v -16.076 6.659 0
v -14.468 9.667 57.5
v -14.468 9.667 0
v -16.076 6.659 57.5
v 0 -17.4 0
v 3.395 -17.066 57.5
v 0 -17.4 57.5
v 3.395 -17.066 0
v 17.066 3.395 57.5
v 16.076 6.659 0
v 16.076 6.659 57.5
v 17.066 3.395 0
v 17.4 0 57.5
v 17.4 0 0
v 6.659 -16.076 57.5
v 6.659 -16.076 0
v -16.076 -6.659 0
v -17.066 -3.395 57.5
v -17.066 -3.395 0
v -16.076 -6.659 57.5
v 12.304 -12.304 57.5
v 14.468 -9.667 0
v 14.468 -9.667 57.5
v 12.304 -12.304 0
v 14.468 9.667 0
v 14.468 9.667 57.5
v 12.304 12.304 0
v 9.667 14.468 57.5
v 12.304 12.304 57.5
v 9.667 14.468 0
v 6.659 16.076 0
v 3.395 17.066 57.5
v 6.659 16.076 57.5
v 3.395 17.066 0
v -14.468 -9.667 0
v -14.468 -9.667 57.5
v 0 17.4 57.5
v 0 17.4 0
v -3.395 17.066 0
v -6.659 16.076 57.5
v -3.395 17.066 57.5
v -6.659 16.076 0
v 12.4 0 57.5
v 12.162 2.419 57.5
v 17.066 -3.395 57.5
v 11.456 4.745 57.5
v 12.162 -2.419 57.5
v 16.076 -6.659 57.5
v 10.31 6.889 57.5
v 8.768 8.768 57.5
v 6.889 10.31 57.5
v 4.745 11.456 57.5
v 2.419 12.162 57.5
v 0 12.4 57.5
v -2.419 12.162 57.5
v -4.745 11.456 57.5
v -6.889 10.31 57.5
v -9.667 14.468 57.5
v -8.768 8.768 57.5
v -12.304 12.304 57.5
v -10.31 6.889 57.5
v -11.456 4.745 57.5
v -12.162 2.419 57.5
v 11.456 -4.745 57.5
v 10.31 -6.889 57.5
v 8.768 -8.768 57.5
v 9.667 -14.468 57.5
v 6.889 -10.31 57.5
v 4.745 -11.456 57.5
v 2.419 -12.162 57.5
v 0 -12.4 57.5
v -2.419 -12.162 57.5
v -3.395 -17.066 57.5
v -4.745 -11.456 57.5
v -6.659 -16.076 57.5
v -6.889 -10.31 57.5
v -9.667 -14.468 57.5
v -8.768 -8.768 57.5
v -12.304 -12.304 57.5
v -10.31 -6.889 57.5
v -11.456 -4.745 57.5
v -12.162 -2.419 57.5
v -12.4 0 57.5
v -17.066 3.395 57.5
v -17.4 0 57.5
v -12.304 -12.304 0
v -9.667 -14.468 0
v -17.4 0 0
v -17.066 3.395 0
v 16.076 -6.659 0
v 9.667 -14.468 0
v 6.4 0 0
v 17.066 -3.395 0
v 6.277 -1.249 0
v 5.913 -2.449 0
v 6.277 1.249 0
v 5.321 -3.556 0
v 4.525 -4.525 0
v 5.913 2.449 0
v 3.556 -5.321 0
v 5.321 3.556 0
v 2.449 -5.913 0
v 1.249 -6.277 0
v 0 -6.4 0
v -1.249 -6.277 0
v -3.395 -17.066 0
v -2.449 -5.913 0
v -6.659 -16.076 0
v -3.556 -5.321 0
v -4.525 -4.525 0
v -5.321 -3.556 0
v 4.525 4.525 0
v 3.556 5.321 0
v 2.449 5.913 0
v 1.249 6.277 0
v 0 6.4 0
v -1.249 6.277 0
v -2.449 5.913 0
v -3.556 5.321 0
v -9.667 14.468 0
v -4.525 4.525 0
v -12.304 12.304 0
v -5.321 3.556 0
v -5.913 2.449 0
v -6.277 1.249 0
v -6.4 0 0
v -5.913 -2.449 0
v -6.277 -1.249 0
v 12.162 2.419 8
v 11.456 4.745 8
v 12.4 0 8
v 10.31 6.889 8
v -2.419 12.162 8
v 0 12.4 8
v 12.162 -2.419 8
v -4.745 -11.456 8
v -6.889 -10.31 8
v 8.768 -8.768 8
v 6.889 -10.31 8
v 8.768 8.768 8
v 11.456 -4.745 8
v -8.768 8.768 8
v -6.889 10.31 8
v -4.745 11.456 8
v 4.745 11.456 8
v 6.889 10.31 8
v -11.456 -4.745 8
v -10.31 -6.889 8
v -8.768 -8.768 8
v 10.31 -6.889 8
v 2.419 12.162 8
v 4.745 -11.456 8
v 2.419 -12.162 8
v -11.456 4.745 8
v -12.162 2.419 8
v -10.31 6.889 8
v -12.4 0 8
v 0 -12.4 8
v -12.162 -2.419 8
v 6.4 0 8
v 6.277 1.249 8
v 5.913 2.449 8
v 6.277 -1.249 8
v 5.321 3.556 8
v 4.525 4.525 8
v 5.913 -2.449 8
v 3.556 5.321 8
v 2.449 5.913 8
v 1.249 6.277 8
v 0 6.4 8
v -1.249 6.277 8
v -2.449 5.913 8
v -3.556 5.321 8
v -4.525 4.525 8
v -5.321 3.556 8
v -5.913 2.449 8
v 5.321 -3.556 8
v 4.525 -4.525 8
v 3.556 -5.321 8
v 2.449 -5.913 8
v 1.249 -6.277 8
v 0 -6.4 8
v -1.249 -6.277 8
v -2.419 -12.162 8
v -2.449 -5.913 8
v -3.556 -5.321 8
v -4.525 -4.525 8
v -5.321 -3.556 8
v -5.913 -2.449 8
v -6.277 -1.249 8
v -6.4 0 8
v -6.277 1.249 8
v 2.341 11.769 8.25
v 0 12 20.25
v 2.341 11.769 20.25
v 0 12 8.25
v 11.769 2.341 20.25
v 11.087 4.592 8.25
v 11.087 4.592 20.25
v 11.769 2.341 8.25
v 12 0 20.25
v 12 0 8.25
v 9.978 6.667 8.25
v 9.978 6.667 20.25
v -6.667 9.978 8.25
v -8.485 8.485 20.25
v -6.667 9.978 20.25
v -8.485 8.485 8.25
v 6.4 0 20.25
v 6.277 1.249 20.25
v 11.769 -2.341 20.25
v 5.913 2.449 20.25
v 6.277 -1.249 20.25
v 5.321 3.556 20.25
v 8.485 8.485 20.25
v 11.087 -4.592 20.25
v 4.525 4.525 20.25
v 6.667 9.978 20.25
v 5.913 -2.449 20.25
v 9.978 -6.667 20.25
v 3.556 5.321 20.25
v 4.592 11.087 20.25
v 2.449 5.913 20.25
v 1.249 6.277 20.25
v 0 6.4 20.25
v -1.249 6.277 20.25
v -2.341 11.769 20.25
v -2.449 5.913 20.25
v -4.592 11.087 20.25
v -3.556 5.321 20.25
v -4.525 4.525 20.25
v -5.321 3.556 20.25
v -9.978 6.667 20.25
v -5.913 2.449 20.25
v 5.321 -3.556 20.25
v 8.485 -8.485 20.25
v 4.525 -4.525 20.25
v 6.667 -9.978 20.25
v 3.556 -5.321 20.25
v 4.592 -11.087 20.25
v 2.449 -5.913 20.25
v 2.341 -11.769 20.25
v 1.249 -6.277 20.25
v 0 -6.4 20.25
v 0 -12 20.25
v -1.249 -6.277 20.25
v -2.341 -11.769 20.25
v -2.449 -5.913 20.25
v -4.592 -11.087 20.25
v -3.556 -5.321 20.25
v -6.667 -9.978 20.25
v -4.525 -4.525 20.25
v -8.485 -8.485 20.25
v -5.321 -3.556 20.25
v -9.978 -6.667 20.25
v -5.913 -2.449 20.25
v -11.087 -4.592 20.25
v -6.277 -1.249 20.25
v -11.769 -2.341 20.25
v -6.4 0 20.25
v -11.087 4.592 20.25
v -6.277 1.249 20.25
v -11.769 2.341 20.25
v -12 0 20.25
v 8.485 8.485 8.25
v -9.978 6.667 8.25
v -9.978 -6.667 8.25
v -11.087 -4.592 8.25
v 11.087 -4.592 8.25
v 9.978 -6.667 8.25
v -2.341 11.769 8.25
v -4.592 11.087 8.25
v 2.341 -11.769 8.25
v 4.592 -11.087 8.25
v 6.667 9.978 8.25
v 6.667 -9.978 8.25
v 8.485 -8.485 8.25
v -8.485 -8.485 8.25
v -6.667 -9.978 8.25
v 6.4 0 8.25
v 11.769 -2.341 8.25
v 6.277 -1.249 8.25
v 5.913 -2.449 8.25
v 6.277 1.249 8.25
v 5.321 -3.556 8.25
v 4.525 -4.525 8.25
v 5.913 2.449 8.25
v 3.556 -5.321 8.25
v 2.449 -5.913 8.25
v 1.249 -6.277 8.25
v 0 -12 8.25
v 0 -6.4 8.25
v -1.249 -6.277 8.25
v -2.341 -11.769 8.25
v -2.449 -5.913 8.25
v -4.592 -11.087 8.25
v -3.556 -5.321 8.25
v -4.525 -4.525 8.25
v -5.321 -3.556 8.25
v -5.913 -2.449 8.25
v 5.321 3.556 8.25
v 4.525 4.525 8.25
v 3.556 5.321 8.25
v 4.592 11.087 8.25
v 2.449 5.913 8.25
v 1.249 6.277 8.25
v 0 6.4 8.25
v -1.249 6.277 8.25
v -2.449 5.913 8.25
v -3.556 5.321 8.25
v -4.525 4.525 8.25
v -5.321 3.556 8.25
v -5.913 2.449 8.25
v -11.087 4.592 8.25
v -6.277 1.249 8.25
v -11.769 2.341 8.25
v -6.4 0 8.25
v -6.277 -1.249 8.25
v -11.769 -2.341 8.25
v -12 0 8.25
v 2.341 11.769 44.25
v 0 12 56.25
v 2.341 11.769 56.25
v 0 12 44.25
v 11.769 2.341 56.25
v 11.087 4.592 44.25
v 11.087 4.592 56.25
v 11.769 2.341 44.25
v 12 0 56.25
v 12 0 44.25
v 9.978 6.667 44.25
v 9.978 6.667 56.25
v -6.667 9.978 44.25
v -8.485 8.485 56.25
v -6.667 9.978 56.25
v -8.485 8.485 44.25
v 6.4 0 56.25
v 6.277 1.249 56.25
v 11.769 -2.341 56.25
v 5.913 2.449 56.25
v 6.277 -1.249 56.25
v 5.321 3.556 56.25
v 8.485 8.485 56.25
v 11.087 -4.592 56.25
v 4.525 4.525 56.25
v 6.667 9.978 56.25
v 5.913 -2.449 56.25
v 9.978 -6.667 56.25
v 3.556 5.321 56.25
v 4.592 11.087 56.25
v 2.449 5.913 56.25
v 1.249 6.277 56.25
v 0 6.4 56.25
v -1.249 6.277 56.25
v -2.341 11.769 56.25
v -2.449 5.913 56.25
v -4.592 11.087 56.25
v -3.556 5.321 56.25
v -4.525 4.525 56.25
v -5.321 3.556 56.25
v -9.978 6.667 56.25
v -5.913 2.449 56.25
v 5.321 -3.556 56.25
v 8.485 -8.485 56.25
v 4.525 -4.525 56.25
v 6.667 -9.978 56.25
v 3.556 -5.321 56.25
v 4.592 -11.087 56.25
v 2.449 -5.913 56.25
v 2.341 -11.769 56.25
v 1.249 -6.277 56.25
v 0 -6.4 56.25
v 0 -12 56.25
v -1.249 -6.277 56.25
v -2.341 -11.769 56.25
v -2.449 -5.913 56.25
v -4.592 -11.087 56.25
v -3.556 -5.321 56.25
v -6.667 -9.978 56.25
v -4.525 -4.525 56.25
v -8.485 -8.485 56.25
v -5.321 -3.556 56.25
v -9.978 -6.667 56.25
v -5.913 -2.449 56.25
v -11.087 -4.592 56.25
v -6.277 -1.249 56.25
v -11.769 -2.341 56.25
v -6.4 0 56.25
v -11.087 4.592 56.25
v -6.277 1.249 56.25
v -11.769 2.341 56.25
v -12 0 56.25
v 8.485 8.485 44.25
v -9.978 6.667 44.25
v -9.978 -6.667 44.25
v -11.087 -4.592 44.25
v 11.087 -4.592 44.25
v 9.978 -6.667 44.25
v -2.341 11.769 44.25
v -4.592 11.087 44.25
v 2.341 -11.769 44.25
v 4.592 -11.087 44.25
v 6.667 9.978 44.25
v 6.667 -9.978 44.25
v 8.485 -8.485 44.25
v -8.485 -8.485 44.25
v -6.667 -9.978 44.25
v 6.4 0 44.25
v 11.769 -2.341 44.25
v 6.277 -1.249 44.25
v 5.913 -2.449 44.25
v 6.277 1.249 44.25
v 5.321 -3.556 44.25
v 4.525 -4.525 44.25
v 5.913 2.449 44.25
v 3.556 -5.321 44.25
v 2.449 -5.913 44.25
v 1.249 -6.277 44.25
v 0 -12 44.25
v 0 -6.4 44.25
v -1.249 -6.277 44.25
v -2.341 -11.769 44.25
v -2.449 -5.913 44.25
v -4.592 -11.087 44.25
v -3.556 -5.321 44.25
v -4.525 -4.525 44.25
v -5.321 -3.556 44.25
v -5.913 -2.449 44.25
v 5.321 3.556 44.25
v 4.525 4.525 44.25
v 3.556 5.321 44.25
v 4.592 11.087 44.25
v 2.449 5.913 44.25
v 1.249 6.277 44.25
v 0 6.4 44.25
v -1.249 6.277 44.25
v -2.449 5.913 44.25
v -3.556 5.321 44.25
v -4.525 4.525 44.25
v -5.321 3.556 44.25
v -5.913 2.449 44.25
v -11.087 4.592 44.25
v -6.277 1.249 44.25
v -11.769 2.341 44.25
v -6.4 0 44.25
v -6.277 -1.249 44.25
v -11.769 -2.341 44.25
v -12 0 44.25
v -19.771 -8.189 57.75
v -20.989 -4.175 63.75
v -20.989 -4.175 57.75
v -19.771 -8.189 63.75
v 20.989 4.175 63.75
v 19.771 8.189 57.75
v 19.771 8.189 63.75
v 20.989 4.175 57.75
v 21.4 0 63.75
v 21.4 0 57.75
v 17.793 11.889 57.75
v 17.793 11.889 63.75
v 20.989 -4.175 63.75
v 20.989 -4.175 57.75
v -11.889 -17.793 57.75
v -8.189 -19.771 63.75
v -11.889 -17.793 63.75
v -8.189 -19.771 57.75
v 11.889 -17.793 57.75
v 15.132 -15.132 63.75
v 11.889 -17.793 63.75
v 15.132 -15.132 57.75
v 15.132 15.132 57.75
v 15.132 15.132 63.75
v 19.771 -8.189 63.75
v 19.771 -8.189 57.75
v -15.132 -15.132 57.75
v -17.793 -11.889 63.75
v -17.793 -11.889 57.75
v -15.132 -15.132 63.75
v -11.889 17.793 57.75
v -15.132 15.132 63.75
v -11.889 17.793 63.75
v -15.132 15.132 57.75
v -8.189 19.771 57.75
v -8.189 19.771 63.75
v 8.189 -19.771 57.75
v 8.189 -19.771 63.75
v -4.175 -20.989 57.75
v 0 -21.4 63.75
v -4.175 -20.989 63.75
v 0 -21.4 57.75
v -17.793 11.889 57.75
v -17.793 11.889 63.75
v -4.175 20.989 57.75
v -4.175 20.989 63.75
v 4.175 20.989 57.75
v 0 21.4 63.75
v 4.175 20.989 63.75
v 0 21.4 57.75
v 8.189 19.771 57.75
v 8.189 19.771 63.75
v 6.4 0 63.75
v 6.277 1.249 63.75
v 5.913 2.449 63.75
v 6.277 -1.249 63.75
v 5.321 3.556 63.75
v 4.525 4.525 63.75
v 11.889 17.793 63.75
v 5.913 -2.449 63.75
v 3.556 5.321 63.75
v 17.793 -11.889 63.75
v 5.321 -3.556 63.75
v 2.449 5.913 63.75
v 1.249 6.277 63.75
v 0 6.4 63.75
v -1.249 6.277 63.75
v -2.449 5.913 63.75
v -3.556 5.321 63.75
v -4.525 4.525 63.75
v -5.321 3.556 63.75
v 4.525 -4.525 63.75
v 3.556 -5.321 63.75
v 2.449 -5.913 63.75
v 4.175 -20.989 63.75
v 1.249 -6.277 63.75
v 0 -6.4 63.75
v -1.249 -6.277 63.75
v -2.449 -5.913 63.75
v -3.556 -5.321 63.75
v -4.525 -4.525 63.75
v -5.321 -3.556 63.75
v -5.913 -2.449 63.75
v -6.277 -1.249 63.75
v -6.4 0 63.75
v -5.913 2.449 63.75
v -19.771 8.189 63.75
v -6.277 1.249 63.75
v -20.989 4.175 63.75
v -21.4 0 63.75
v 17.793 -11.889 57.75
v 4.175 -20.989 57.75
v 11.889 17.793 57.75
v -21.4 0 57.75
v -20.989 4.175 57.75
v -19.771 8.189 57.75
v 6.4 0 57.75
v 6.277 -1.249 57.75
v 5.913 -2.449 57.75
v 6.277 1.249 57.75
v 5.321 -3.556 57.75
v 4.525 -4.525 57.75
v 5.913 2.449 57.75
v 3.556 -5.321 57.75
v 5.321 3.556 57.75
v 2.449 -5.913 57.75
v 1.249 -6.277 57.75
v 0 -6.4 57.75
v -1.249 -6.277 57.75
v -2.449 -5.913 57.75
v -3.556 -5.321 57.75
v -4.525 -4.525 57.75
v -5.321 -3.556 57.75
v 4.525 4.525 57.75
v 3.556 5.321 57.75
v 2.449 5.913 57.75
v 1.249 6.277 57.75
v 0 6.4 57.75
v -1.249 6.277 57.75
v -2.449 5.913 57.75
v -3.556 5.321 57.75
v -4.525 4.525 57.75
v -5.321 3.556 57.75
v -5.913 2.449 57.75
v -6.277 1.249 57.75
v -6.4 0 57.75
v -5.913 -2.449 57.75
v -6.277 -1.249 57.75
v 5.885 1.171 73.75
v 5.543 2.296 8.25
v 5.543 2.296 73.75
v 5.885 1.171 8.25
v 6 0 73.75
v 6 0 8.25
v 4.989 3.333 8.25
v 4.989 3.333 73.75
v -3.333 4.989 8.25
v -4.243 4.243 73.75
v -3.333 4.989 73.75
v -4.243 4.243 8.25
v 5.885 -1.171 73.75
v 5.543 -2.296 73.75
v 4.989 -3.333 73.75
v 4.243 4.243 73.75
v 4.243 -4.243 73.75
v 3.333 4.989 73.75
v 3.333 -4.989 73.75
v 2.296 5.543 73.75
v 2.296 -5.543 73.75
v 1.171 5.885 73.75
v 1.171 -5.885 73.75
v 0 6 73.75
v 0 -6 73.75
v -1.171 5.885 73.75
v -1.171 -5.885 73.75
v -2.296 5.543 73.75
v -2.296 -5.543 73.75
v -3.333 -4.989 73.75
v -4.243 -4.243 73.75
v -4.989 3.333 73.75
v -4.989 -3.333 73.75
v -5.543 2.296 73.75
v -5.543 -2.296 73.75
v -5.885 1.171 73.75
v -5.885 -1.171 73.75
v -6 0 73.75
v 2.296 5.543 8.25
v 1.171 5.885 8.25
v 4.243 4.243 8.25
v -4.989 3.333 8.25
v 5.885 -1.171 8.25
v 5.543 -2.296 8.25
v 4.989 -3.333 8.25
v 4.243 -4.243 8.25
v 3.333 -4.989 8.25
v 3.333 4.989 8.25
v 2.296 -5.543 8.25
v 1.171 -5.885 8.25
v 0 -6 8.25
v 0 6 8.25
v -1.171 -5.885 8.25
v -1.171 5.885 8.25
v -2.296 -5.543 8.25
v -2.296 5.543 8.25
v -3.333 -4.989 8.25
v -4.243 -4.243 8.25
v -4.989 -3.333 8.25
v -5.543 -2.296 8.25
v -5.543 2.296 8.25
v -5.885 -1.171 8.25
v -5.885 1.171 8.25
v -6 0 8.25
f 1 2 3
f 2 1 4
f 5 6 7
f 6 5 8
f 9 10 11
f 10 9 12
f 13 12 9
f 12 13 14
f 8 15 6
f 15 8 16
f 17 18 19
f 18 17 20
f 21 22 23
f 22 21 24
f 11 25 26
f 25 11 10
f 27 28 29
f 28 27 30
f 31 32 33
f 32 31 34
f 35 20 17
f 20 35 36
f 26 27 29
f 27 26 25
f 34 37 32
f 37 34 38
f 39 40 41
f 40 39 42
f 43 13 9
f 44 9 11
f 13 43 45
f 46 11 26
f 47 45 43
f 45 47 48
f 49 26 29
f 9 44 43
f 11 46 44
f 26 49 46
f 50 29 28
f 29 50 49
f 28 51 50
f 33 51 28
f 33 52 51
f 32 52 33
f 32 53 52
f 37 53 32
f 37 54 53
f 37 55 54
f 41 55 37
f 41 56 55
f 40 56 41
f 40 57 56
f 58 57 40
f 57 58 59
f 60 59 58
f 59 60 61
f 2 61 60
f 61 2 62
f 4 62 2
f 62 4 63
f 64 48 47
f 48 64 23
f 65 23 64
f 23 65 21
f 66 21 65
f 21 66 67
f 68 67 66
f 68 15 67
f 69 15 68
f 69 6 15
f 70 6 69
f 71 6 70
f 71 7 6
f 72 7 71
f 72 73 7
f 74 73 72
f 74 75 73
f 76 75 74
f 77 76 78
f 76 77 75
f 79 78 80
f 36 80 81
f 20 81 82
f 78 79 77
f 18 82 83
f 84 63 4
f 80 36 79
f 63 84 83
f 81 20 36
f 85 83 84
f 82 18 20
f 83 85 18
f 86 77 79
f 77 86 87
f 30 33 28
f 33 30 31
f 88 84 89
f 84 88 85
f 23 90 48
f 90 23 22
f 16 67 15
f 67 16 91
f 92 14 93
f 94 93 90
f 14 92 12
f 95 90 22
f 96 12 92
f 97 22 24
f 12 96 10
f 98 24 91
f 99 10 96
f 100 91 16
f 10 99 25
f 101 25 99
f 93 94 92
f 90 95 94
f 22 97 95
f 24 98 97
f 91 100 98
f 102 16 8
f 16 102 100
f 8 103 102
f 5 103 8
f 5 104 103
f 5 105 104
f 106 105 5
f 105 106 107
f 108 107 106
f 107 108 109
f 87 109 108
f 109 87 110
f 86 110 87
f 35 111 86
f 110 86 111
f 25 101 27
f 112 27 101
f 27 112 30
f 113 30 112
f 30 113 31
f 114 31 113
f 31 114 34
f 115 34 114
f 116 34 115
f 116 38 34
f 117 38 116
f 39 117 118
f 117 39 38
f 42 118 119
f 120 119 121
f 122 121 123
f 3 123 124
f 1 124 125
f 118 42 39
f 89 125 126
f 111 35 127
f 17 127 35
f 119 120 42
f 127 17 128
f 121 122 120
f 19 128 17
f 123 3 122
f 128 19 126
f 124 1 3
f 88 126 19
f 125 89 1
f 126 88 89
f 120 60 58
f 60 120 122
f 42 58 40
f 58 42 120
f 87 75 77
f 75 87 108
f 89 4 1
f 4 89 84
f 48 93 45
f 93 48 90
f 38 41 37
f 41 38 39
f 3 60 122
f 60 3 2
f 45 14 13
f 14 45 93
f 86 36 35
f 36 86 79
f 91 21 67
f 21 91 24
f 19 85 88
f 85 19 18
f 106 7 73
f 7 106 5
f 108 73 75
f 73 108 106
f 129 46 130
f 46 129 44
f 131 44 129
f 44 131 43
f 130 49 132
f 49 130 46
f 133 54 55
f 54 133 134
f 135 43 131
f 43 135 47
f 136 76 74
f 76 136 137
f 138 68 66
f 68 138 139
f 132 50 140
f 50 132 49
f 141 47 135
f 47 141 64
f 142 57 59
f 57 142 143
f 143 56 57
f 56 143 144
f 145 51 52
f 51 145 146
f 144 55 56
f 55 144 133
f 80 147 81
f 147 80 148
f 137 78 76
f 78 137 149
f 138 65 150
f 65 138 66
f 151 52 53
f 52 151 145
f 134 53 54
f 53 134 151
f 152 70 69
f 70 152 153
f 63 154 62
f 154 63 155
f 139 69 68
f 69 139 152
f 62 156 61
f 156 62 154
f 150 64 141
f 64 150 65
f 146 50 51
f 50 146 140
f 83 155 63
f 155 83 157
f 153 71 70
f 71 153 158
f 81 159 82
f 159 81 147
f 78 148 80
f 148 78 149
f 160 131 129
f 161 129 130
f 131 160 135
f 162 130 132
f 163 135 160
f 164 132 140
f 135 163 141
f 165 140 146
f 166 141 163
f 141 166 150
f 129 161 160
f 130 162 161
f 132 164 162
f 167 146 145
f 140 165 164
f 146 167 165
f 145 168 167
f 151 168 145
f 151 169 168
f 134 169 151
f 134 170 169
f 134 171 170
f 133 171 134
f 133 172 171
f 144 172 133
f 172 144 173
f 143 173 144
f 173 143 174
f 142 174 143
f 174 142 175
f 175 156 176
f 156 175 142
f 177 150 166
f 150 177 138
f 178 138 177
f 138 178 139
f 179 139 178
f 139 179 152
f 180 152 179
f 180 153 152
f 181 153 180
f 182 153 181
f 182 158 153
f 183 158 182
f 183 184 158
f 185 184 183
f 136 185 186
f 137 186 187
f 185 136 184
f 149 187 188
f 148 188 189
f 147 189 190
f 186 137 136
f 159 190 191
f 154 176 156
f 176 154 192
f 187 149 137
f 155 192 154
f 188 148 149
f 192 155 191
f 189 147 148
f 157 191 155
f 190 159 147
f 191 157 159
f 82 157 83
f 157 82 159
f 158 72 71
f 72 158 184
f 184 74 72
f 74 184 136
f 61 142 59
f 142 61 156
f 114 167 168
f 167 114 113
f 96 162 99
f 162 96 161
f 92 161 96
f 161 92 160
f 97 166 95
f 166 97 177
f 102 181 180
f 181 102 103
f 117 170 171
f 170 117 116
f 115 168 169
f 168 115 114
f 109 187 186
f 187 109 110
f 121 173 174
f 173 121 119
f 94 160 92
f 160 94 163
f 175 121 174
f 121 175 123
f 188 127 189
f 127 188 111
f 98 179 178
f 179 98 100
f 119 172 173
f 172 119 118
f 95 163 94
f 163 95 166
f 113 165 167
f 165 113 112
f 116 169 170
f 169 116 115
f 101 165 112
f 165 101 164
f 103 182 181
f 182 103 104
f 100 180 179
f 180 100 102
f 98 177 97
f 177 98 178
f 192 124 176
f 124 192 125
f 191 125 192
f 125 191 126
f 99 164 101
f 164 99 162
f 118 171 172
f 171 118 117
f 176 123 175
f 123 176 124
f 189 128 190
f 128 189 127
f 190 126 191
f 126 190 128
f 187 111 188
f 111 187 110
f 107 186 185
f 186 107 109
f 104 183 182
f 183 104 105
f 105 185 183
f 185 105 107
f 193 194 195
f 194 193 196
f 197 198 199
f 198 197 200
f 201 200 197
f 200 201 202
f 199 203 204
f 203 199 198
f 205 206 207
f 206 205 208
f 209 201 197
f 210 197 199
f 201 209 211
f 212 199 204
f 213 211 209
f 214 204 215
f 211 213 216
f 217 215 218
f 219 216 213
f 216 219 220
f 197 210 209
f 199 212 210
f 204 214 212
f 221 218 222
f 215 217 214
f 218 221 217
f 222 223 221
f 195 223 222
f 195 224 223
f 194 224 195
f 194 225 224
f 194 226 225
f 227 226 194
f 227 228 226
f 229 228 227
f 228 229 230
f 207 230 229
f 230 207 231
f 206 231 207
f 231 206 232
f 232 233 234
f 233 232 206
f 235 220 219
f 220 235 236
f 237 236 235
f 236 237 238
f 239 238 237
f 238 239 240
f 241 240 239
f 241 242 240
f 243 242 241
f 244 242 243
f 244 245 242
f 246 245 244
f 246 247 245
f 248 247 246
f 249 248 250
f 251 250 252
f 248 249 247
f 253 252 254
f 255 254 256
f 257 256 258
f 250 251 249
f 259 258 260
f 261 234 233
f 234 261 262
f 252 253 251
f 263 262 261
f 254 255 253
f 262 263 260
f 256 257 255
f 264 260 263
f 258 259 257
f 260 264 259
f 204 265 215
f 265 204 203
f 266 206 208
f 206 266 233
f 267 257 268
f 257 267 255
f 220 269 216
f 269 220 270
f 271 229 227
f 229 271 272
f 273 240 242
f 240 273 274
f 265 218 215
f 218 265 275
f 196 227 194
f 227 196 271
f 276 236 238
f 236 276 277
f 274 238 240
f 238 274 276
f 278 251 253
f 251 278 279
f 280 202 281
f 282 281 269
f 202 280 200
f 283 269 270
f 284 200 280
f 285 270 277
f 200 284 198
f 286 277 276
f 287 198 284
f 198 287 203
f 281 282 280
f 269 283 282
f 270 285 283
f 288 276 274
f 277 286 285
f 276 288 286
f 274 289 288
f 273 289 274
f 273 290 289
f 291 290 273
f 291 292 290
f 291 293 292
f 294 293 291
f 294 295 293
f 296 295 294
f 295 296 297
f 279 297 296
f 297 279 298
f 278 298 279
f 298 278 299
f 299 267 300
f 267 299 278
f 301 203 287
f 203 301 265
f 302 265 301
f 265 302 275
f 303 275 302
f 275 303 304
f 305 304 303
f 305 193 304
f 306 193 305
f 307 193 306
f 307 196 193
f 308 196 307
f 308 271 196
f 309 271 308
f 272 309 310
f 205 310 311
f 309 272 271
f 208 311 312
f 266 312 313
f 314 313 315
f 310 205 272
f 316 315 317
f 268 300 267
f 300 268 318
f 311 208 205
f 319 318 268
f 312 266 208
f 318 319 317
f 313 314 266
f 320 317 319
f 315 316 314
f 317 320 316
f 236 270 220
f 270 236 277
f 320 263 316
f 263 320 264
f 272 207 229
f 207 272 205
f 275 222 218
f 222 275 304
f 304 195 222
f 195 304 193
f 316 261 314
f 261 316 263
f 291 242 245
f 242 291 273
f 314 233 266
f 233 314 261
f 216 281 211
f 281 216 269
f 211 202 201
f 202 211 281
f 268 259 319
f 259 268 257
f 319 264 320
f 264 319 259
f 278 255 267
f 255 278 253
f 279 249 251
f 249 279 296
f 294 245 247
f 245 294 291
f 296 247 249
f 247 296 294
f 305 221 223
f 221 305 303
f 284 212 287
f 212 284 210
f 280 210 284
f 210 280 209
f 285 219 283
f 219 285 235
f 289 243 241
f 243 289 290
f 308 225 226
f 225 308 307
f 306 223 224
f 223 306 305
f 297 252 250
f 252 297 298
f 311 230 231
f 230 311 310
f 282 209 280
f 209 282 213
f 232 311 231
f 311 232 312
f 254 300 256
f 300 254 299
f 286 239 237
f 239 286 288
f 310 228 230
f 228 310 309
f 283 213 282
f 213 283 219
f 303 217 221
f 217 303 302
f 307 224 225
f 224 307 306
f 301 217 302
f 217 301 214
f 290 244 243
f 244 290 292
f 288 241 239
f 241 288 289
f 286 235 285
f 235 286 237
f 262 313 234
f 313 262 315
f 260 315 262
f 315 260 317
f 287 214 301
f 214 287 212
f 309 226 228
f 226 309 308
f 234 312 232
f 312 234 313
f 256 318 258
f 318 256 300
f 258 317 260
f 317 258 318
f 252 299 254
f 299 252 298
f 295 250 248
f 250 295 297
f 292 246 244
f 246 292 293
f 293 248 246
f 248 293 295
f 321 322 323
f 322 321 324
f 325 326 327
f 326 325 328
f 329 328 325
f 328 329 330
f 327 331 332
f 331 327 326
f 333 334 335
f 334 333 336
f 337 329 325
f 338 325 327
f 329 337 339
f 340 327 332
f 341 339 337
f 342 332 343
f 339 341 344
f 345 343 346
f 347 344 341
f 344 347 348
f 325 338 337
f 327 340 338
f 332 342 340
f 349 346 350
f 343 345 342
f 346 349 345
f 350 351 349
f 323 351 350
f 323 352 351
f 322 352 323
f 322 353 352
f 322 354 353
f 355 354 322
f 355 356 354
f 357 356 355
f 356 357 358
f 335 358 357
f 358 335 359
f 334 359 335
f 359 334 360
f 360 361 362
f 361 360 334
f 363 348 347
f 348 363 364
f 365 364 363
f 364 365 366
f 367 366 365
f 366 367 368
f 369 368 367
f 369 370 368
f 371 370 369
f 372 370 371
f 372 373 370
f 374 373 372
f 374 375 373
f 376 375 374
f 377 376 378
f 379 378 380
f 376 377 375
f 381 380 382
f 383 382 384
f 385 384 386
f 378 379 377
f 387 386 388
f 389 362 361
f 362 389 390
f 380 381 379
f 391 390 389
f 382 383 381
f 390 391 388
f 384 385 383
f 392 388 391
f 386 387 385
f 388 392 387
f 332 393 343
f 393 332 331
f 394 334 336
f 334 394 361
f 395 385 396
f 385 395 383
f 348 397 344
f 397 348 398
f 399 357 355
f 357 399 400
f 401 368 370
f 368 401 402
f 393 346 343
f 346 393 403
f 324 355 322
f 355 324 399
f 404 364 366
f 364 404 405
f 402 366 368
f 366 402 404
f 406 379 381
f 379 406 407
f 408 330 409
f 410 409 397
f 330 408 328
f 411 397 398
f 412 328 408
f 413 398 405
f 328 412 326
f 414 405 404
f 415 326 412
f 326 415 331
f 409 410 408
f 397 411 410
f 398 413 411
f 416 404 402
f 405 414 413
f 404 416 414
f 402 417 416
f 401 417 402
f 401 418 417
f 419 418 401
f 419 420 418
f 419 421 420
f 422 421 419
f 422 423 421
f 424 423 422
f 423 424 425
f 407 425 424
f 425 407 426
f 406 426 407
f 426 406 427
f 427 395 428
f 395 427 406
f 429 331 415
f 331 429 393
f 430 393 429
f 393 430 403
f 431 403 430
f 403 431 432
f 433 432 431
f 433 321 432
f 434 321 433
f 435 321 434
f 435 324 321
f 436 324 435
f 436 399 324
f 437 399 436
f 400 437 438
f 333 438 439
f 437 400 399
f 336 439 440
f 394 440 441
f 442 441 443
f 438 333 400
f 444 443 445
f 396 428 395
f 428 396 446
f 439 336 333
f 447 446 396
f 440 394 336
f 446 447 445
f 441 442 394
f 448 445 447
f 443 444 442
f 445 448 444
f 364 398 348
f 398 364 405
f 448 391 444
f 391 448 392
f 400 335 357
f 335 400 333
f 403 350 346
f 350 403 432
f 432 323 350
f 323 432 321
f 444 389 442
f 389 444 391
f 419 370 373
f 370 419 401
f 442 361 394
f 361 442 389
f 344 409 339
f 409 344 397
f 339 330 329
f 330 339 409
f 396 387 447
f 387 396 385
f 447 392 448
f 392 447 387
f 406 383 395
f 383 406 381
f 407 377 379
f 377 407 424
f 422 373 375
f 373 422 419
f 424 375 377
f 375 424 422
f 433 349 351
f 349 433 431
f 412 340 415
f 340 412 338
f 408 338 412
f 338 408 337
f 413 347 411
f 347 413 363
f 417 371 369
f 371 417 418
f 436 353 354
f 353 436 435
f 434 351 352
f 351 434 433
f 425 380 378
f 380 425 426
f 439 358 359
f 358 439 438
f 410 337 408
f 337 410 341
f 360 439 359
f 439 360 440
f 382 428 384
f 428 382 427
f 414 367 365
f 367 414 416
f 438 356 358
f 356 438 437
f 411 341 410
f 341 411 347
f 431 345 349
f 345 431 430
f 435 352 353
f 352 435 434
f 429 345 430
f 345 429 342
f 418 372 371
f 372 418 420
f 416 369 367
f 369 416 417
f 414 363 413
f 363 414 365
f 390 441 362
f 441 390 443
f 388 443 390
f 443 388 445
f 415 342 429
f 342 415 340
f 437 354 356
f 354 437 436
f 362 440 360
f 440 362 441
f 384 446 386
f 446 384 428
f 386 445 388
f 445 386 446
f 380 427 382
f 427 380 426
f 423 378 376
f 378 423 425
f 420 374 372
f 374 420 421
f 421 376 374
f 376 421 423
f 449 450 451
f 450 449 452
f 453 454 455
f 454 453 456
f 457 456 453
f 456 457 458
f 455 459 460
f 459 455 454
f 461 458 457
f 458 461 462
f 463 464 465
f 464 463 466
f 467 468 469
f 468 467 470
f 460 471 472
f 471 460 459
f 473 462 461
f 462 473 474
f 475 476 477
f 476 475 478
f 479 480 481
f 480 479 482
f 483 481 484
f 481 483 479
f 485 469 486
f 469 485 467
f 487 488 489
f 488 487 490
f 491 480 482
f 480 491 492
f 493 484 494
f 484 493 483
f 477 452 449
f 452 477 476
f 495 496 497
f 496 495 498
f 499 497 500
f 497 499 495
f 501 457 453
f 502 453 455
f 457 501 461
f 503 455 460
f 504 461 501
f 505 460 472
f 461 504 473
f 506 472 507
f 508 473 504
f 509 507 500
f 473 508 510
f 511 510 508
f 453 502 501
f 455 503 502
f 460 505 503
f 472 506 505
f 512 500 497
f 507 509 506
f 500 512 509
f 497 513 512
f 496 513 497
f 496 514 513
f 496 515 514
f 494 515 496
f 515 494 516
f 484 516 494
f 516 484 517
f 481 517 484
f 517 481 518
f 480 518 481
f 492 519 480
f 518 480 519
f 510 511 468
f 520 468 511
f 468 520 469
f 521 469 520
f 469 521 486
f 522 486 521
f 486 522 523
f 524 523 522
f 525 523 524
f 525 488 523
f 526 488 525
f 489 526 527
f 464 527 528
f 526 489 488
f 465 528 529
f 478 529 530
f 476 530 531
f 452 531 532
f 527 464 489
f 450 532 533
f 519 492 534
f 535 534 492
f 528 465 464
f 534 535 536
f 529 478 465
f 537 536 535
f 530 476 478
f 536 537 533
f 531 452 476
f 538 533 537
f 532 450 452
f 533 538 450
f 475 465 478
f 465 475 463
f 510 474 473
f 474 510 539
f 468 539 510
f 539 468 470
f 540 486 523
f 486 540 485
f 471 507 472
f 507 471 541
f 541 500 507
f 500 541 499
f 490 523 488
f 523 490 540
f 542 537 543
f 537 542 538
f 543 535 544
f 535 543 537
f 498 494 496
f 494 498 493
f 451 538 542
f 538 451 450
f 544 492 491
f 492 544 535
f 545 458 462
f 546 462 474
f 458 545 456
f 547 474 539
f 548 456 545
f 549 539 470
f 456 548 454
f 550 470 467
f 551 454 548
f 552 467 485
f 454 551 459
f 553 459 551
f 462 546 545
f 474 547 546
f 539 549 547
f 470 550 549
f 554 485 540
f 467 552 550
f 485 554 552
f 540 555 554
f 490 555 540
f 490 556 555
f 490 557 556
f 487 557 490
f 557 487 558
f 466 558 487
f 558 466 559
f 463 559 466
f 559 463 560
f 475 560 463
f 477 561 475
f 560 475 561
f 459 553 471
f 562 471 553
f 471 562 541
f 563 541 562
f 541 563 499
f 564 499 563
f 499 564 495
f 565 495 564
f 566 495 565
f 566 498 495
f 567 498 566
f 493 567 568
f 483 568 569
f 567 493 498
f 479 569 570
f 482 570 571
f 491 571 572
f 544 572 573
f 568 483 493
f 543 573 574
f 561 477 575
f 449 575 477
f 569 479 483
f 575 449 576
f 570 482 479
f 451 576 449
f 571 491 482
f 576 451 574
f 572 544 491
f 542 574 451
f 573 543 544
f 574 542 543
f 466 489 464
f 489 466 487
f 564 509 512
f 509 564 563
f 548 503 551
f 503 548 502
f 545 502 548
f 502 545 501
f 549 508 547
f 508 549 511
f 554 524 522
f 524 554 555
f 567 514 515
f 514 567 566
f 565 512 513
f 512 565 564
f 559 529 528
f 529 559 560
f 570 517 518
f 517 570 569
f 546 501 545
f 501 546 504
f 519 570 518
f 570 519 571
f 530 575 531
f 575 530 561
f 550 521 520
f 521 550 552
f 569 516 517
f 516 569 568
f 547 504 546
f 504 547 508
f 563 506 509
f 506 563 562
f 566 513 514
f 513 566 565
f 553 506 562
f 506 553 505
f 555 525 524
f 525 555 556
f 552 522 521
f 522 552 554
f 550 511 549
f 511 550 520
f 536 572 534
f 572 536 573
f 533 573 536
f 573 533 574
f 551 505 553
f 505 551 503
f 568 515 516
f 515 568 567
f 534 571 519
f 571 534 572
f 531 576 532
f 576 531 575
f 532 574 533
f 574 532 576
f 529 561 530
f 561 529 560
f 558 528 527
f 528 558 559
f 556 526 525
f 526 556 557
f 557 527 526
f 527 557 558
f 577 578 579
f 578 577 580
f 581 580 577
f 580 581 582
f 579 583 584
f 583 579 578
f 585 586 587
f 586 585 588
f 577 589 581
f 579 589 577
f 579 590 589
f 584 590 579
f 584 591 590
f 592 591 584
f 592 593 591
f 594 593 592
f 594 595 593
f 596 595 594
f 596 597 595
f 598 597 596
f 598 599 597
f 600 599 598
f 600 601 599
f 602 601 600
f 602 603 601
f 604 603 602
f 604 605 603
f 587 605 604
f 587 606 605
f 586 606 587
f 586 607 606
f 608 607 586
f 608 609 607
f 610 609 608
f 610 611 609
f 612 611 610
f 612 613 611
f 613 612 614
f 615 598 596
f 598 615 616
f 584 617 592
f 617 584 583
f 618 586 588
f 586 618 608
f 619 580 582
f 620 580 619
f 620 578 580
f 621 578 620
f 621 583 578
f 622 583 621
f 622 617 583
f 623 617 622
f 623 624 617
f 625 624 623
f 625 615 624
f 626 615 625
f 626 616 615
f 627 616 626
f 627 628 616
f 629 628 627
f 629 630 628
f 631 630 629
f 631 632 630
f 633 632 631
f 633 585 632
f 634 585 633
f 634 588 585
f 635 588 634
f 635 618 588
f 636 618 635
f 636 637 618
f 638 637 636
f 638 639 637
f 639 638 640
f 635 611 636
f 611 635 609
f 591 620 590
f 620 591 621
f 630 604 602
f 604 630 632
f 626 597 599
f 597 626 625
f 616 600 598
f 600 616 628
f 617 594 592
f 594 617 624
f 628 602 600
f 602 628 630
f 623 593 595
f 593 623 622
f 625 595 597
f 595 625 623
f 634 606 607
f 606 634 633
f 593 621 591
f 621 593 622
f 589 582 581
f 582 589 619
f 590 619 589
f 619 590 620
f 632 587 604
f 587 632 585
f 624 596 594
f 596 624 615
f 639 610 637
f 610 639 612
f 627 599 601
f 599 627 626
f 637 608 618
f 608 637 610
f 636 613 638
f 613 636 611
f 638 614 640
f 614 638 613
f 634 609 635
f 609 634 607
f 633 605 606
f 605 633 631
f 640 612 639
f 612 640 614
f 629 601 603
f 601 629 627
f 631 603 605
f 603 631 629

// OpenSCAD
$fn = 32;

// ------------------------------------------------------------------------
// Shaft station: cup d34.8 x 57.5 mm, shaft d12
// Every part is its own module, assembly() places every instance.
// ------------------------------------------------------------------------

// --- part 1 ---
module housing_cup() {
  difference() {
    cylinder(h = 57.5, d = 34.8);
    translate([0, 0, 8]) cylinder(h = 50.5, d = 24.8);
    translate([0, 0, -1]) cylinder(h = 10, d = 12.8);
  }
}

// --- part 2 ---
module bearing_lower() {
  difference() {
      translate([0, 0, 0]) cylinder(h = 12, d = 24);
      translate([0, 0, -1]) cylinder(h = 14, d = 12.8);
    }
}

// --- part 3 ---
module bearing_upper() {
  difference() {
      translate([0, 0, 0]) cylinder(h = 12, d = 24);
      translate([0, 0, -1]) cylinder(h = 14, d = 12.8);
    }
}

// --- part 4 ---
module station_shaft() {
  translate([0, 0, -32.75]) cylinder(h = 65.5, d = 12);
}

// --- part 5 ---
module station_cover() {
  difference() {
    cylinder(h = 6, d = 42.8);
    translate([0, 0, -1]) cylinder(h = 8, d = 12.8);
  }
}

// --- assembly ---
module assembly() {
  color([0.80, 0.24, 0.20]) translate([0, 0, 0]) rotate([0, 0, 0]) housing_cup();
  color([0.20, 0.45, 0.75]) translate([0, 0, 8.25]) rotate([0, 0, 0]) bearing_lower();
  color([0.25, 0.62, 0.32]) translate([0, 0, 44.25]) rotate([0, 0, 0]) bearing_upper();
  color([0.92, 0.70, 0.18]) translate([0, 0, 41]) rotate([0, 0, 0]) station_shaft();
  color([0.58, 0.35, 0.70]) translate([0, 0, 57.75]) rotate([0, 0, 0]) station_cover();
}

assembly();
